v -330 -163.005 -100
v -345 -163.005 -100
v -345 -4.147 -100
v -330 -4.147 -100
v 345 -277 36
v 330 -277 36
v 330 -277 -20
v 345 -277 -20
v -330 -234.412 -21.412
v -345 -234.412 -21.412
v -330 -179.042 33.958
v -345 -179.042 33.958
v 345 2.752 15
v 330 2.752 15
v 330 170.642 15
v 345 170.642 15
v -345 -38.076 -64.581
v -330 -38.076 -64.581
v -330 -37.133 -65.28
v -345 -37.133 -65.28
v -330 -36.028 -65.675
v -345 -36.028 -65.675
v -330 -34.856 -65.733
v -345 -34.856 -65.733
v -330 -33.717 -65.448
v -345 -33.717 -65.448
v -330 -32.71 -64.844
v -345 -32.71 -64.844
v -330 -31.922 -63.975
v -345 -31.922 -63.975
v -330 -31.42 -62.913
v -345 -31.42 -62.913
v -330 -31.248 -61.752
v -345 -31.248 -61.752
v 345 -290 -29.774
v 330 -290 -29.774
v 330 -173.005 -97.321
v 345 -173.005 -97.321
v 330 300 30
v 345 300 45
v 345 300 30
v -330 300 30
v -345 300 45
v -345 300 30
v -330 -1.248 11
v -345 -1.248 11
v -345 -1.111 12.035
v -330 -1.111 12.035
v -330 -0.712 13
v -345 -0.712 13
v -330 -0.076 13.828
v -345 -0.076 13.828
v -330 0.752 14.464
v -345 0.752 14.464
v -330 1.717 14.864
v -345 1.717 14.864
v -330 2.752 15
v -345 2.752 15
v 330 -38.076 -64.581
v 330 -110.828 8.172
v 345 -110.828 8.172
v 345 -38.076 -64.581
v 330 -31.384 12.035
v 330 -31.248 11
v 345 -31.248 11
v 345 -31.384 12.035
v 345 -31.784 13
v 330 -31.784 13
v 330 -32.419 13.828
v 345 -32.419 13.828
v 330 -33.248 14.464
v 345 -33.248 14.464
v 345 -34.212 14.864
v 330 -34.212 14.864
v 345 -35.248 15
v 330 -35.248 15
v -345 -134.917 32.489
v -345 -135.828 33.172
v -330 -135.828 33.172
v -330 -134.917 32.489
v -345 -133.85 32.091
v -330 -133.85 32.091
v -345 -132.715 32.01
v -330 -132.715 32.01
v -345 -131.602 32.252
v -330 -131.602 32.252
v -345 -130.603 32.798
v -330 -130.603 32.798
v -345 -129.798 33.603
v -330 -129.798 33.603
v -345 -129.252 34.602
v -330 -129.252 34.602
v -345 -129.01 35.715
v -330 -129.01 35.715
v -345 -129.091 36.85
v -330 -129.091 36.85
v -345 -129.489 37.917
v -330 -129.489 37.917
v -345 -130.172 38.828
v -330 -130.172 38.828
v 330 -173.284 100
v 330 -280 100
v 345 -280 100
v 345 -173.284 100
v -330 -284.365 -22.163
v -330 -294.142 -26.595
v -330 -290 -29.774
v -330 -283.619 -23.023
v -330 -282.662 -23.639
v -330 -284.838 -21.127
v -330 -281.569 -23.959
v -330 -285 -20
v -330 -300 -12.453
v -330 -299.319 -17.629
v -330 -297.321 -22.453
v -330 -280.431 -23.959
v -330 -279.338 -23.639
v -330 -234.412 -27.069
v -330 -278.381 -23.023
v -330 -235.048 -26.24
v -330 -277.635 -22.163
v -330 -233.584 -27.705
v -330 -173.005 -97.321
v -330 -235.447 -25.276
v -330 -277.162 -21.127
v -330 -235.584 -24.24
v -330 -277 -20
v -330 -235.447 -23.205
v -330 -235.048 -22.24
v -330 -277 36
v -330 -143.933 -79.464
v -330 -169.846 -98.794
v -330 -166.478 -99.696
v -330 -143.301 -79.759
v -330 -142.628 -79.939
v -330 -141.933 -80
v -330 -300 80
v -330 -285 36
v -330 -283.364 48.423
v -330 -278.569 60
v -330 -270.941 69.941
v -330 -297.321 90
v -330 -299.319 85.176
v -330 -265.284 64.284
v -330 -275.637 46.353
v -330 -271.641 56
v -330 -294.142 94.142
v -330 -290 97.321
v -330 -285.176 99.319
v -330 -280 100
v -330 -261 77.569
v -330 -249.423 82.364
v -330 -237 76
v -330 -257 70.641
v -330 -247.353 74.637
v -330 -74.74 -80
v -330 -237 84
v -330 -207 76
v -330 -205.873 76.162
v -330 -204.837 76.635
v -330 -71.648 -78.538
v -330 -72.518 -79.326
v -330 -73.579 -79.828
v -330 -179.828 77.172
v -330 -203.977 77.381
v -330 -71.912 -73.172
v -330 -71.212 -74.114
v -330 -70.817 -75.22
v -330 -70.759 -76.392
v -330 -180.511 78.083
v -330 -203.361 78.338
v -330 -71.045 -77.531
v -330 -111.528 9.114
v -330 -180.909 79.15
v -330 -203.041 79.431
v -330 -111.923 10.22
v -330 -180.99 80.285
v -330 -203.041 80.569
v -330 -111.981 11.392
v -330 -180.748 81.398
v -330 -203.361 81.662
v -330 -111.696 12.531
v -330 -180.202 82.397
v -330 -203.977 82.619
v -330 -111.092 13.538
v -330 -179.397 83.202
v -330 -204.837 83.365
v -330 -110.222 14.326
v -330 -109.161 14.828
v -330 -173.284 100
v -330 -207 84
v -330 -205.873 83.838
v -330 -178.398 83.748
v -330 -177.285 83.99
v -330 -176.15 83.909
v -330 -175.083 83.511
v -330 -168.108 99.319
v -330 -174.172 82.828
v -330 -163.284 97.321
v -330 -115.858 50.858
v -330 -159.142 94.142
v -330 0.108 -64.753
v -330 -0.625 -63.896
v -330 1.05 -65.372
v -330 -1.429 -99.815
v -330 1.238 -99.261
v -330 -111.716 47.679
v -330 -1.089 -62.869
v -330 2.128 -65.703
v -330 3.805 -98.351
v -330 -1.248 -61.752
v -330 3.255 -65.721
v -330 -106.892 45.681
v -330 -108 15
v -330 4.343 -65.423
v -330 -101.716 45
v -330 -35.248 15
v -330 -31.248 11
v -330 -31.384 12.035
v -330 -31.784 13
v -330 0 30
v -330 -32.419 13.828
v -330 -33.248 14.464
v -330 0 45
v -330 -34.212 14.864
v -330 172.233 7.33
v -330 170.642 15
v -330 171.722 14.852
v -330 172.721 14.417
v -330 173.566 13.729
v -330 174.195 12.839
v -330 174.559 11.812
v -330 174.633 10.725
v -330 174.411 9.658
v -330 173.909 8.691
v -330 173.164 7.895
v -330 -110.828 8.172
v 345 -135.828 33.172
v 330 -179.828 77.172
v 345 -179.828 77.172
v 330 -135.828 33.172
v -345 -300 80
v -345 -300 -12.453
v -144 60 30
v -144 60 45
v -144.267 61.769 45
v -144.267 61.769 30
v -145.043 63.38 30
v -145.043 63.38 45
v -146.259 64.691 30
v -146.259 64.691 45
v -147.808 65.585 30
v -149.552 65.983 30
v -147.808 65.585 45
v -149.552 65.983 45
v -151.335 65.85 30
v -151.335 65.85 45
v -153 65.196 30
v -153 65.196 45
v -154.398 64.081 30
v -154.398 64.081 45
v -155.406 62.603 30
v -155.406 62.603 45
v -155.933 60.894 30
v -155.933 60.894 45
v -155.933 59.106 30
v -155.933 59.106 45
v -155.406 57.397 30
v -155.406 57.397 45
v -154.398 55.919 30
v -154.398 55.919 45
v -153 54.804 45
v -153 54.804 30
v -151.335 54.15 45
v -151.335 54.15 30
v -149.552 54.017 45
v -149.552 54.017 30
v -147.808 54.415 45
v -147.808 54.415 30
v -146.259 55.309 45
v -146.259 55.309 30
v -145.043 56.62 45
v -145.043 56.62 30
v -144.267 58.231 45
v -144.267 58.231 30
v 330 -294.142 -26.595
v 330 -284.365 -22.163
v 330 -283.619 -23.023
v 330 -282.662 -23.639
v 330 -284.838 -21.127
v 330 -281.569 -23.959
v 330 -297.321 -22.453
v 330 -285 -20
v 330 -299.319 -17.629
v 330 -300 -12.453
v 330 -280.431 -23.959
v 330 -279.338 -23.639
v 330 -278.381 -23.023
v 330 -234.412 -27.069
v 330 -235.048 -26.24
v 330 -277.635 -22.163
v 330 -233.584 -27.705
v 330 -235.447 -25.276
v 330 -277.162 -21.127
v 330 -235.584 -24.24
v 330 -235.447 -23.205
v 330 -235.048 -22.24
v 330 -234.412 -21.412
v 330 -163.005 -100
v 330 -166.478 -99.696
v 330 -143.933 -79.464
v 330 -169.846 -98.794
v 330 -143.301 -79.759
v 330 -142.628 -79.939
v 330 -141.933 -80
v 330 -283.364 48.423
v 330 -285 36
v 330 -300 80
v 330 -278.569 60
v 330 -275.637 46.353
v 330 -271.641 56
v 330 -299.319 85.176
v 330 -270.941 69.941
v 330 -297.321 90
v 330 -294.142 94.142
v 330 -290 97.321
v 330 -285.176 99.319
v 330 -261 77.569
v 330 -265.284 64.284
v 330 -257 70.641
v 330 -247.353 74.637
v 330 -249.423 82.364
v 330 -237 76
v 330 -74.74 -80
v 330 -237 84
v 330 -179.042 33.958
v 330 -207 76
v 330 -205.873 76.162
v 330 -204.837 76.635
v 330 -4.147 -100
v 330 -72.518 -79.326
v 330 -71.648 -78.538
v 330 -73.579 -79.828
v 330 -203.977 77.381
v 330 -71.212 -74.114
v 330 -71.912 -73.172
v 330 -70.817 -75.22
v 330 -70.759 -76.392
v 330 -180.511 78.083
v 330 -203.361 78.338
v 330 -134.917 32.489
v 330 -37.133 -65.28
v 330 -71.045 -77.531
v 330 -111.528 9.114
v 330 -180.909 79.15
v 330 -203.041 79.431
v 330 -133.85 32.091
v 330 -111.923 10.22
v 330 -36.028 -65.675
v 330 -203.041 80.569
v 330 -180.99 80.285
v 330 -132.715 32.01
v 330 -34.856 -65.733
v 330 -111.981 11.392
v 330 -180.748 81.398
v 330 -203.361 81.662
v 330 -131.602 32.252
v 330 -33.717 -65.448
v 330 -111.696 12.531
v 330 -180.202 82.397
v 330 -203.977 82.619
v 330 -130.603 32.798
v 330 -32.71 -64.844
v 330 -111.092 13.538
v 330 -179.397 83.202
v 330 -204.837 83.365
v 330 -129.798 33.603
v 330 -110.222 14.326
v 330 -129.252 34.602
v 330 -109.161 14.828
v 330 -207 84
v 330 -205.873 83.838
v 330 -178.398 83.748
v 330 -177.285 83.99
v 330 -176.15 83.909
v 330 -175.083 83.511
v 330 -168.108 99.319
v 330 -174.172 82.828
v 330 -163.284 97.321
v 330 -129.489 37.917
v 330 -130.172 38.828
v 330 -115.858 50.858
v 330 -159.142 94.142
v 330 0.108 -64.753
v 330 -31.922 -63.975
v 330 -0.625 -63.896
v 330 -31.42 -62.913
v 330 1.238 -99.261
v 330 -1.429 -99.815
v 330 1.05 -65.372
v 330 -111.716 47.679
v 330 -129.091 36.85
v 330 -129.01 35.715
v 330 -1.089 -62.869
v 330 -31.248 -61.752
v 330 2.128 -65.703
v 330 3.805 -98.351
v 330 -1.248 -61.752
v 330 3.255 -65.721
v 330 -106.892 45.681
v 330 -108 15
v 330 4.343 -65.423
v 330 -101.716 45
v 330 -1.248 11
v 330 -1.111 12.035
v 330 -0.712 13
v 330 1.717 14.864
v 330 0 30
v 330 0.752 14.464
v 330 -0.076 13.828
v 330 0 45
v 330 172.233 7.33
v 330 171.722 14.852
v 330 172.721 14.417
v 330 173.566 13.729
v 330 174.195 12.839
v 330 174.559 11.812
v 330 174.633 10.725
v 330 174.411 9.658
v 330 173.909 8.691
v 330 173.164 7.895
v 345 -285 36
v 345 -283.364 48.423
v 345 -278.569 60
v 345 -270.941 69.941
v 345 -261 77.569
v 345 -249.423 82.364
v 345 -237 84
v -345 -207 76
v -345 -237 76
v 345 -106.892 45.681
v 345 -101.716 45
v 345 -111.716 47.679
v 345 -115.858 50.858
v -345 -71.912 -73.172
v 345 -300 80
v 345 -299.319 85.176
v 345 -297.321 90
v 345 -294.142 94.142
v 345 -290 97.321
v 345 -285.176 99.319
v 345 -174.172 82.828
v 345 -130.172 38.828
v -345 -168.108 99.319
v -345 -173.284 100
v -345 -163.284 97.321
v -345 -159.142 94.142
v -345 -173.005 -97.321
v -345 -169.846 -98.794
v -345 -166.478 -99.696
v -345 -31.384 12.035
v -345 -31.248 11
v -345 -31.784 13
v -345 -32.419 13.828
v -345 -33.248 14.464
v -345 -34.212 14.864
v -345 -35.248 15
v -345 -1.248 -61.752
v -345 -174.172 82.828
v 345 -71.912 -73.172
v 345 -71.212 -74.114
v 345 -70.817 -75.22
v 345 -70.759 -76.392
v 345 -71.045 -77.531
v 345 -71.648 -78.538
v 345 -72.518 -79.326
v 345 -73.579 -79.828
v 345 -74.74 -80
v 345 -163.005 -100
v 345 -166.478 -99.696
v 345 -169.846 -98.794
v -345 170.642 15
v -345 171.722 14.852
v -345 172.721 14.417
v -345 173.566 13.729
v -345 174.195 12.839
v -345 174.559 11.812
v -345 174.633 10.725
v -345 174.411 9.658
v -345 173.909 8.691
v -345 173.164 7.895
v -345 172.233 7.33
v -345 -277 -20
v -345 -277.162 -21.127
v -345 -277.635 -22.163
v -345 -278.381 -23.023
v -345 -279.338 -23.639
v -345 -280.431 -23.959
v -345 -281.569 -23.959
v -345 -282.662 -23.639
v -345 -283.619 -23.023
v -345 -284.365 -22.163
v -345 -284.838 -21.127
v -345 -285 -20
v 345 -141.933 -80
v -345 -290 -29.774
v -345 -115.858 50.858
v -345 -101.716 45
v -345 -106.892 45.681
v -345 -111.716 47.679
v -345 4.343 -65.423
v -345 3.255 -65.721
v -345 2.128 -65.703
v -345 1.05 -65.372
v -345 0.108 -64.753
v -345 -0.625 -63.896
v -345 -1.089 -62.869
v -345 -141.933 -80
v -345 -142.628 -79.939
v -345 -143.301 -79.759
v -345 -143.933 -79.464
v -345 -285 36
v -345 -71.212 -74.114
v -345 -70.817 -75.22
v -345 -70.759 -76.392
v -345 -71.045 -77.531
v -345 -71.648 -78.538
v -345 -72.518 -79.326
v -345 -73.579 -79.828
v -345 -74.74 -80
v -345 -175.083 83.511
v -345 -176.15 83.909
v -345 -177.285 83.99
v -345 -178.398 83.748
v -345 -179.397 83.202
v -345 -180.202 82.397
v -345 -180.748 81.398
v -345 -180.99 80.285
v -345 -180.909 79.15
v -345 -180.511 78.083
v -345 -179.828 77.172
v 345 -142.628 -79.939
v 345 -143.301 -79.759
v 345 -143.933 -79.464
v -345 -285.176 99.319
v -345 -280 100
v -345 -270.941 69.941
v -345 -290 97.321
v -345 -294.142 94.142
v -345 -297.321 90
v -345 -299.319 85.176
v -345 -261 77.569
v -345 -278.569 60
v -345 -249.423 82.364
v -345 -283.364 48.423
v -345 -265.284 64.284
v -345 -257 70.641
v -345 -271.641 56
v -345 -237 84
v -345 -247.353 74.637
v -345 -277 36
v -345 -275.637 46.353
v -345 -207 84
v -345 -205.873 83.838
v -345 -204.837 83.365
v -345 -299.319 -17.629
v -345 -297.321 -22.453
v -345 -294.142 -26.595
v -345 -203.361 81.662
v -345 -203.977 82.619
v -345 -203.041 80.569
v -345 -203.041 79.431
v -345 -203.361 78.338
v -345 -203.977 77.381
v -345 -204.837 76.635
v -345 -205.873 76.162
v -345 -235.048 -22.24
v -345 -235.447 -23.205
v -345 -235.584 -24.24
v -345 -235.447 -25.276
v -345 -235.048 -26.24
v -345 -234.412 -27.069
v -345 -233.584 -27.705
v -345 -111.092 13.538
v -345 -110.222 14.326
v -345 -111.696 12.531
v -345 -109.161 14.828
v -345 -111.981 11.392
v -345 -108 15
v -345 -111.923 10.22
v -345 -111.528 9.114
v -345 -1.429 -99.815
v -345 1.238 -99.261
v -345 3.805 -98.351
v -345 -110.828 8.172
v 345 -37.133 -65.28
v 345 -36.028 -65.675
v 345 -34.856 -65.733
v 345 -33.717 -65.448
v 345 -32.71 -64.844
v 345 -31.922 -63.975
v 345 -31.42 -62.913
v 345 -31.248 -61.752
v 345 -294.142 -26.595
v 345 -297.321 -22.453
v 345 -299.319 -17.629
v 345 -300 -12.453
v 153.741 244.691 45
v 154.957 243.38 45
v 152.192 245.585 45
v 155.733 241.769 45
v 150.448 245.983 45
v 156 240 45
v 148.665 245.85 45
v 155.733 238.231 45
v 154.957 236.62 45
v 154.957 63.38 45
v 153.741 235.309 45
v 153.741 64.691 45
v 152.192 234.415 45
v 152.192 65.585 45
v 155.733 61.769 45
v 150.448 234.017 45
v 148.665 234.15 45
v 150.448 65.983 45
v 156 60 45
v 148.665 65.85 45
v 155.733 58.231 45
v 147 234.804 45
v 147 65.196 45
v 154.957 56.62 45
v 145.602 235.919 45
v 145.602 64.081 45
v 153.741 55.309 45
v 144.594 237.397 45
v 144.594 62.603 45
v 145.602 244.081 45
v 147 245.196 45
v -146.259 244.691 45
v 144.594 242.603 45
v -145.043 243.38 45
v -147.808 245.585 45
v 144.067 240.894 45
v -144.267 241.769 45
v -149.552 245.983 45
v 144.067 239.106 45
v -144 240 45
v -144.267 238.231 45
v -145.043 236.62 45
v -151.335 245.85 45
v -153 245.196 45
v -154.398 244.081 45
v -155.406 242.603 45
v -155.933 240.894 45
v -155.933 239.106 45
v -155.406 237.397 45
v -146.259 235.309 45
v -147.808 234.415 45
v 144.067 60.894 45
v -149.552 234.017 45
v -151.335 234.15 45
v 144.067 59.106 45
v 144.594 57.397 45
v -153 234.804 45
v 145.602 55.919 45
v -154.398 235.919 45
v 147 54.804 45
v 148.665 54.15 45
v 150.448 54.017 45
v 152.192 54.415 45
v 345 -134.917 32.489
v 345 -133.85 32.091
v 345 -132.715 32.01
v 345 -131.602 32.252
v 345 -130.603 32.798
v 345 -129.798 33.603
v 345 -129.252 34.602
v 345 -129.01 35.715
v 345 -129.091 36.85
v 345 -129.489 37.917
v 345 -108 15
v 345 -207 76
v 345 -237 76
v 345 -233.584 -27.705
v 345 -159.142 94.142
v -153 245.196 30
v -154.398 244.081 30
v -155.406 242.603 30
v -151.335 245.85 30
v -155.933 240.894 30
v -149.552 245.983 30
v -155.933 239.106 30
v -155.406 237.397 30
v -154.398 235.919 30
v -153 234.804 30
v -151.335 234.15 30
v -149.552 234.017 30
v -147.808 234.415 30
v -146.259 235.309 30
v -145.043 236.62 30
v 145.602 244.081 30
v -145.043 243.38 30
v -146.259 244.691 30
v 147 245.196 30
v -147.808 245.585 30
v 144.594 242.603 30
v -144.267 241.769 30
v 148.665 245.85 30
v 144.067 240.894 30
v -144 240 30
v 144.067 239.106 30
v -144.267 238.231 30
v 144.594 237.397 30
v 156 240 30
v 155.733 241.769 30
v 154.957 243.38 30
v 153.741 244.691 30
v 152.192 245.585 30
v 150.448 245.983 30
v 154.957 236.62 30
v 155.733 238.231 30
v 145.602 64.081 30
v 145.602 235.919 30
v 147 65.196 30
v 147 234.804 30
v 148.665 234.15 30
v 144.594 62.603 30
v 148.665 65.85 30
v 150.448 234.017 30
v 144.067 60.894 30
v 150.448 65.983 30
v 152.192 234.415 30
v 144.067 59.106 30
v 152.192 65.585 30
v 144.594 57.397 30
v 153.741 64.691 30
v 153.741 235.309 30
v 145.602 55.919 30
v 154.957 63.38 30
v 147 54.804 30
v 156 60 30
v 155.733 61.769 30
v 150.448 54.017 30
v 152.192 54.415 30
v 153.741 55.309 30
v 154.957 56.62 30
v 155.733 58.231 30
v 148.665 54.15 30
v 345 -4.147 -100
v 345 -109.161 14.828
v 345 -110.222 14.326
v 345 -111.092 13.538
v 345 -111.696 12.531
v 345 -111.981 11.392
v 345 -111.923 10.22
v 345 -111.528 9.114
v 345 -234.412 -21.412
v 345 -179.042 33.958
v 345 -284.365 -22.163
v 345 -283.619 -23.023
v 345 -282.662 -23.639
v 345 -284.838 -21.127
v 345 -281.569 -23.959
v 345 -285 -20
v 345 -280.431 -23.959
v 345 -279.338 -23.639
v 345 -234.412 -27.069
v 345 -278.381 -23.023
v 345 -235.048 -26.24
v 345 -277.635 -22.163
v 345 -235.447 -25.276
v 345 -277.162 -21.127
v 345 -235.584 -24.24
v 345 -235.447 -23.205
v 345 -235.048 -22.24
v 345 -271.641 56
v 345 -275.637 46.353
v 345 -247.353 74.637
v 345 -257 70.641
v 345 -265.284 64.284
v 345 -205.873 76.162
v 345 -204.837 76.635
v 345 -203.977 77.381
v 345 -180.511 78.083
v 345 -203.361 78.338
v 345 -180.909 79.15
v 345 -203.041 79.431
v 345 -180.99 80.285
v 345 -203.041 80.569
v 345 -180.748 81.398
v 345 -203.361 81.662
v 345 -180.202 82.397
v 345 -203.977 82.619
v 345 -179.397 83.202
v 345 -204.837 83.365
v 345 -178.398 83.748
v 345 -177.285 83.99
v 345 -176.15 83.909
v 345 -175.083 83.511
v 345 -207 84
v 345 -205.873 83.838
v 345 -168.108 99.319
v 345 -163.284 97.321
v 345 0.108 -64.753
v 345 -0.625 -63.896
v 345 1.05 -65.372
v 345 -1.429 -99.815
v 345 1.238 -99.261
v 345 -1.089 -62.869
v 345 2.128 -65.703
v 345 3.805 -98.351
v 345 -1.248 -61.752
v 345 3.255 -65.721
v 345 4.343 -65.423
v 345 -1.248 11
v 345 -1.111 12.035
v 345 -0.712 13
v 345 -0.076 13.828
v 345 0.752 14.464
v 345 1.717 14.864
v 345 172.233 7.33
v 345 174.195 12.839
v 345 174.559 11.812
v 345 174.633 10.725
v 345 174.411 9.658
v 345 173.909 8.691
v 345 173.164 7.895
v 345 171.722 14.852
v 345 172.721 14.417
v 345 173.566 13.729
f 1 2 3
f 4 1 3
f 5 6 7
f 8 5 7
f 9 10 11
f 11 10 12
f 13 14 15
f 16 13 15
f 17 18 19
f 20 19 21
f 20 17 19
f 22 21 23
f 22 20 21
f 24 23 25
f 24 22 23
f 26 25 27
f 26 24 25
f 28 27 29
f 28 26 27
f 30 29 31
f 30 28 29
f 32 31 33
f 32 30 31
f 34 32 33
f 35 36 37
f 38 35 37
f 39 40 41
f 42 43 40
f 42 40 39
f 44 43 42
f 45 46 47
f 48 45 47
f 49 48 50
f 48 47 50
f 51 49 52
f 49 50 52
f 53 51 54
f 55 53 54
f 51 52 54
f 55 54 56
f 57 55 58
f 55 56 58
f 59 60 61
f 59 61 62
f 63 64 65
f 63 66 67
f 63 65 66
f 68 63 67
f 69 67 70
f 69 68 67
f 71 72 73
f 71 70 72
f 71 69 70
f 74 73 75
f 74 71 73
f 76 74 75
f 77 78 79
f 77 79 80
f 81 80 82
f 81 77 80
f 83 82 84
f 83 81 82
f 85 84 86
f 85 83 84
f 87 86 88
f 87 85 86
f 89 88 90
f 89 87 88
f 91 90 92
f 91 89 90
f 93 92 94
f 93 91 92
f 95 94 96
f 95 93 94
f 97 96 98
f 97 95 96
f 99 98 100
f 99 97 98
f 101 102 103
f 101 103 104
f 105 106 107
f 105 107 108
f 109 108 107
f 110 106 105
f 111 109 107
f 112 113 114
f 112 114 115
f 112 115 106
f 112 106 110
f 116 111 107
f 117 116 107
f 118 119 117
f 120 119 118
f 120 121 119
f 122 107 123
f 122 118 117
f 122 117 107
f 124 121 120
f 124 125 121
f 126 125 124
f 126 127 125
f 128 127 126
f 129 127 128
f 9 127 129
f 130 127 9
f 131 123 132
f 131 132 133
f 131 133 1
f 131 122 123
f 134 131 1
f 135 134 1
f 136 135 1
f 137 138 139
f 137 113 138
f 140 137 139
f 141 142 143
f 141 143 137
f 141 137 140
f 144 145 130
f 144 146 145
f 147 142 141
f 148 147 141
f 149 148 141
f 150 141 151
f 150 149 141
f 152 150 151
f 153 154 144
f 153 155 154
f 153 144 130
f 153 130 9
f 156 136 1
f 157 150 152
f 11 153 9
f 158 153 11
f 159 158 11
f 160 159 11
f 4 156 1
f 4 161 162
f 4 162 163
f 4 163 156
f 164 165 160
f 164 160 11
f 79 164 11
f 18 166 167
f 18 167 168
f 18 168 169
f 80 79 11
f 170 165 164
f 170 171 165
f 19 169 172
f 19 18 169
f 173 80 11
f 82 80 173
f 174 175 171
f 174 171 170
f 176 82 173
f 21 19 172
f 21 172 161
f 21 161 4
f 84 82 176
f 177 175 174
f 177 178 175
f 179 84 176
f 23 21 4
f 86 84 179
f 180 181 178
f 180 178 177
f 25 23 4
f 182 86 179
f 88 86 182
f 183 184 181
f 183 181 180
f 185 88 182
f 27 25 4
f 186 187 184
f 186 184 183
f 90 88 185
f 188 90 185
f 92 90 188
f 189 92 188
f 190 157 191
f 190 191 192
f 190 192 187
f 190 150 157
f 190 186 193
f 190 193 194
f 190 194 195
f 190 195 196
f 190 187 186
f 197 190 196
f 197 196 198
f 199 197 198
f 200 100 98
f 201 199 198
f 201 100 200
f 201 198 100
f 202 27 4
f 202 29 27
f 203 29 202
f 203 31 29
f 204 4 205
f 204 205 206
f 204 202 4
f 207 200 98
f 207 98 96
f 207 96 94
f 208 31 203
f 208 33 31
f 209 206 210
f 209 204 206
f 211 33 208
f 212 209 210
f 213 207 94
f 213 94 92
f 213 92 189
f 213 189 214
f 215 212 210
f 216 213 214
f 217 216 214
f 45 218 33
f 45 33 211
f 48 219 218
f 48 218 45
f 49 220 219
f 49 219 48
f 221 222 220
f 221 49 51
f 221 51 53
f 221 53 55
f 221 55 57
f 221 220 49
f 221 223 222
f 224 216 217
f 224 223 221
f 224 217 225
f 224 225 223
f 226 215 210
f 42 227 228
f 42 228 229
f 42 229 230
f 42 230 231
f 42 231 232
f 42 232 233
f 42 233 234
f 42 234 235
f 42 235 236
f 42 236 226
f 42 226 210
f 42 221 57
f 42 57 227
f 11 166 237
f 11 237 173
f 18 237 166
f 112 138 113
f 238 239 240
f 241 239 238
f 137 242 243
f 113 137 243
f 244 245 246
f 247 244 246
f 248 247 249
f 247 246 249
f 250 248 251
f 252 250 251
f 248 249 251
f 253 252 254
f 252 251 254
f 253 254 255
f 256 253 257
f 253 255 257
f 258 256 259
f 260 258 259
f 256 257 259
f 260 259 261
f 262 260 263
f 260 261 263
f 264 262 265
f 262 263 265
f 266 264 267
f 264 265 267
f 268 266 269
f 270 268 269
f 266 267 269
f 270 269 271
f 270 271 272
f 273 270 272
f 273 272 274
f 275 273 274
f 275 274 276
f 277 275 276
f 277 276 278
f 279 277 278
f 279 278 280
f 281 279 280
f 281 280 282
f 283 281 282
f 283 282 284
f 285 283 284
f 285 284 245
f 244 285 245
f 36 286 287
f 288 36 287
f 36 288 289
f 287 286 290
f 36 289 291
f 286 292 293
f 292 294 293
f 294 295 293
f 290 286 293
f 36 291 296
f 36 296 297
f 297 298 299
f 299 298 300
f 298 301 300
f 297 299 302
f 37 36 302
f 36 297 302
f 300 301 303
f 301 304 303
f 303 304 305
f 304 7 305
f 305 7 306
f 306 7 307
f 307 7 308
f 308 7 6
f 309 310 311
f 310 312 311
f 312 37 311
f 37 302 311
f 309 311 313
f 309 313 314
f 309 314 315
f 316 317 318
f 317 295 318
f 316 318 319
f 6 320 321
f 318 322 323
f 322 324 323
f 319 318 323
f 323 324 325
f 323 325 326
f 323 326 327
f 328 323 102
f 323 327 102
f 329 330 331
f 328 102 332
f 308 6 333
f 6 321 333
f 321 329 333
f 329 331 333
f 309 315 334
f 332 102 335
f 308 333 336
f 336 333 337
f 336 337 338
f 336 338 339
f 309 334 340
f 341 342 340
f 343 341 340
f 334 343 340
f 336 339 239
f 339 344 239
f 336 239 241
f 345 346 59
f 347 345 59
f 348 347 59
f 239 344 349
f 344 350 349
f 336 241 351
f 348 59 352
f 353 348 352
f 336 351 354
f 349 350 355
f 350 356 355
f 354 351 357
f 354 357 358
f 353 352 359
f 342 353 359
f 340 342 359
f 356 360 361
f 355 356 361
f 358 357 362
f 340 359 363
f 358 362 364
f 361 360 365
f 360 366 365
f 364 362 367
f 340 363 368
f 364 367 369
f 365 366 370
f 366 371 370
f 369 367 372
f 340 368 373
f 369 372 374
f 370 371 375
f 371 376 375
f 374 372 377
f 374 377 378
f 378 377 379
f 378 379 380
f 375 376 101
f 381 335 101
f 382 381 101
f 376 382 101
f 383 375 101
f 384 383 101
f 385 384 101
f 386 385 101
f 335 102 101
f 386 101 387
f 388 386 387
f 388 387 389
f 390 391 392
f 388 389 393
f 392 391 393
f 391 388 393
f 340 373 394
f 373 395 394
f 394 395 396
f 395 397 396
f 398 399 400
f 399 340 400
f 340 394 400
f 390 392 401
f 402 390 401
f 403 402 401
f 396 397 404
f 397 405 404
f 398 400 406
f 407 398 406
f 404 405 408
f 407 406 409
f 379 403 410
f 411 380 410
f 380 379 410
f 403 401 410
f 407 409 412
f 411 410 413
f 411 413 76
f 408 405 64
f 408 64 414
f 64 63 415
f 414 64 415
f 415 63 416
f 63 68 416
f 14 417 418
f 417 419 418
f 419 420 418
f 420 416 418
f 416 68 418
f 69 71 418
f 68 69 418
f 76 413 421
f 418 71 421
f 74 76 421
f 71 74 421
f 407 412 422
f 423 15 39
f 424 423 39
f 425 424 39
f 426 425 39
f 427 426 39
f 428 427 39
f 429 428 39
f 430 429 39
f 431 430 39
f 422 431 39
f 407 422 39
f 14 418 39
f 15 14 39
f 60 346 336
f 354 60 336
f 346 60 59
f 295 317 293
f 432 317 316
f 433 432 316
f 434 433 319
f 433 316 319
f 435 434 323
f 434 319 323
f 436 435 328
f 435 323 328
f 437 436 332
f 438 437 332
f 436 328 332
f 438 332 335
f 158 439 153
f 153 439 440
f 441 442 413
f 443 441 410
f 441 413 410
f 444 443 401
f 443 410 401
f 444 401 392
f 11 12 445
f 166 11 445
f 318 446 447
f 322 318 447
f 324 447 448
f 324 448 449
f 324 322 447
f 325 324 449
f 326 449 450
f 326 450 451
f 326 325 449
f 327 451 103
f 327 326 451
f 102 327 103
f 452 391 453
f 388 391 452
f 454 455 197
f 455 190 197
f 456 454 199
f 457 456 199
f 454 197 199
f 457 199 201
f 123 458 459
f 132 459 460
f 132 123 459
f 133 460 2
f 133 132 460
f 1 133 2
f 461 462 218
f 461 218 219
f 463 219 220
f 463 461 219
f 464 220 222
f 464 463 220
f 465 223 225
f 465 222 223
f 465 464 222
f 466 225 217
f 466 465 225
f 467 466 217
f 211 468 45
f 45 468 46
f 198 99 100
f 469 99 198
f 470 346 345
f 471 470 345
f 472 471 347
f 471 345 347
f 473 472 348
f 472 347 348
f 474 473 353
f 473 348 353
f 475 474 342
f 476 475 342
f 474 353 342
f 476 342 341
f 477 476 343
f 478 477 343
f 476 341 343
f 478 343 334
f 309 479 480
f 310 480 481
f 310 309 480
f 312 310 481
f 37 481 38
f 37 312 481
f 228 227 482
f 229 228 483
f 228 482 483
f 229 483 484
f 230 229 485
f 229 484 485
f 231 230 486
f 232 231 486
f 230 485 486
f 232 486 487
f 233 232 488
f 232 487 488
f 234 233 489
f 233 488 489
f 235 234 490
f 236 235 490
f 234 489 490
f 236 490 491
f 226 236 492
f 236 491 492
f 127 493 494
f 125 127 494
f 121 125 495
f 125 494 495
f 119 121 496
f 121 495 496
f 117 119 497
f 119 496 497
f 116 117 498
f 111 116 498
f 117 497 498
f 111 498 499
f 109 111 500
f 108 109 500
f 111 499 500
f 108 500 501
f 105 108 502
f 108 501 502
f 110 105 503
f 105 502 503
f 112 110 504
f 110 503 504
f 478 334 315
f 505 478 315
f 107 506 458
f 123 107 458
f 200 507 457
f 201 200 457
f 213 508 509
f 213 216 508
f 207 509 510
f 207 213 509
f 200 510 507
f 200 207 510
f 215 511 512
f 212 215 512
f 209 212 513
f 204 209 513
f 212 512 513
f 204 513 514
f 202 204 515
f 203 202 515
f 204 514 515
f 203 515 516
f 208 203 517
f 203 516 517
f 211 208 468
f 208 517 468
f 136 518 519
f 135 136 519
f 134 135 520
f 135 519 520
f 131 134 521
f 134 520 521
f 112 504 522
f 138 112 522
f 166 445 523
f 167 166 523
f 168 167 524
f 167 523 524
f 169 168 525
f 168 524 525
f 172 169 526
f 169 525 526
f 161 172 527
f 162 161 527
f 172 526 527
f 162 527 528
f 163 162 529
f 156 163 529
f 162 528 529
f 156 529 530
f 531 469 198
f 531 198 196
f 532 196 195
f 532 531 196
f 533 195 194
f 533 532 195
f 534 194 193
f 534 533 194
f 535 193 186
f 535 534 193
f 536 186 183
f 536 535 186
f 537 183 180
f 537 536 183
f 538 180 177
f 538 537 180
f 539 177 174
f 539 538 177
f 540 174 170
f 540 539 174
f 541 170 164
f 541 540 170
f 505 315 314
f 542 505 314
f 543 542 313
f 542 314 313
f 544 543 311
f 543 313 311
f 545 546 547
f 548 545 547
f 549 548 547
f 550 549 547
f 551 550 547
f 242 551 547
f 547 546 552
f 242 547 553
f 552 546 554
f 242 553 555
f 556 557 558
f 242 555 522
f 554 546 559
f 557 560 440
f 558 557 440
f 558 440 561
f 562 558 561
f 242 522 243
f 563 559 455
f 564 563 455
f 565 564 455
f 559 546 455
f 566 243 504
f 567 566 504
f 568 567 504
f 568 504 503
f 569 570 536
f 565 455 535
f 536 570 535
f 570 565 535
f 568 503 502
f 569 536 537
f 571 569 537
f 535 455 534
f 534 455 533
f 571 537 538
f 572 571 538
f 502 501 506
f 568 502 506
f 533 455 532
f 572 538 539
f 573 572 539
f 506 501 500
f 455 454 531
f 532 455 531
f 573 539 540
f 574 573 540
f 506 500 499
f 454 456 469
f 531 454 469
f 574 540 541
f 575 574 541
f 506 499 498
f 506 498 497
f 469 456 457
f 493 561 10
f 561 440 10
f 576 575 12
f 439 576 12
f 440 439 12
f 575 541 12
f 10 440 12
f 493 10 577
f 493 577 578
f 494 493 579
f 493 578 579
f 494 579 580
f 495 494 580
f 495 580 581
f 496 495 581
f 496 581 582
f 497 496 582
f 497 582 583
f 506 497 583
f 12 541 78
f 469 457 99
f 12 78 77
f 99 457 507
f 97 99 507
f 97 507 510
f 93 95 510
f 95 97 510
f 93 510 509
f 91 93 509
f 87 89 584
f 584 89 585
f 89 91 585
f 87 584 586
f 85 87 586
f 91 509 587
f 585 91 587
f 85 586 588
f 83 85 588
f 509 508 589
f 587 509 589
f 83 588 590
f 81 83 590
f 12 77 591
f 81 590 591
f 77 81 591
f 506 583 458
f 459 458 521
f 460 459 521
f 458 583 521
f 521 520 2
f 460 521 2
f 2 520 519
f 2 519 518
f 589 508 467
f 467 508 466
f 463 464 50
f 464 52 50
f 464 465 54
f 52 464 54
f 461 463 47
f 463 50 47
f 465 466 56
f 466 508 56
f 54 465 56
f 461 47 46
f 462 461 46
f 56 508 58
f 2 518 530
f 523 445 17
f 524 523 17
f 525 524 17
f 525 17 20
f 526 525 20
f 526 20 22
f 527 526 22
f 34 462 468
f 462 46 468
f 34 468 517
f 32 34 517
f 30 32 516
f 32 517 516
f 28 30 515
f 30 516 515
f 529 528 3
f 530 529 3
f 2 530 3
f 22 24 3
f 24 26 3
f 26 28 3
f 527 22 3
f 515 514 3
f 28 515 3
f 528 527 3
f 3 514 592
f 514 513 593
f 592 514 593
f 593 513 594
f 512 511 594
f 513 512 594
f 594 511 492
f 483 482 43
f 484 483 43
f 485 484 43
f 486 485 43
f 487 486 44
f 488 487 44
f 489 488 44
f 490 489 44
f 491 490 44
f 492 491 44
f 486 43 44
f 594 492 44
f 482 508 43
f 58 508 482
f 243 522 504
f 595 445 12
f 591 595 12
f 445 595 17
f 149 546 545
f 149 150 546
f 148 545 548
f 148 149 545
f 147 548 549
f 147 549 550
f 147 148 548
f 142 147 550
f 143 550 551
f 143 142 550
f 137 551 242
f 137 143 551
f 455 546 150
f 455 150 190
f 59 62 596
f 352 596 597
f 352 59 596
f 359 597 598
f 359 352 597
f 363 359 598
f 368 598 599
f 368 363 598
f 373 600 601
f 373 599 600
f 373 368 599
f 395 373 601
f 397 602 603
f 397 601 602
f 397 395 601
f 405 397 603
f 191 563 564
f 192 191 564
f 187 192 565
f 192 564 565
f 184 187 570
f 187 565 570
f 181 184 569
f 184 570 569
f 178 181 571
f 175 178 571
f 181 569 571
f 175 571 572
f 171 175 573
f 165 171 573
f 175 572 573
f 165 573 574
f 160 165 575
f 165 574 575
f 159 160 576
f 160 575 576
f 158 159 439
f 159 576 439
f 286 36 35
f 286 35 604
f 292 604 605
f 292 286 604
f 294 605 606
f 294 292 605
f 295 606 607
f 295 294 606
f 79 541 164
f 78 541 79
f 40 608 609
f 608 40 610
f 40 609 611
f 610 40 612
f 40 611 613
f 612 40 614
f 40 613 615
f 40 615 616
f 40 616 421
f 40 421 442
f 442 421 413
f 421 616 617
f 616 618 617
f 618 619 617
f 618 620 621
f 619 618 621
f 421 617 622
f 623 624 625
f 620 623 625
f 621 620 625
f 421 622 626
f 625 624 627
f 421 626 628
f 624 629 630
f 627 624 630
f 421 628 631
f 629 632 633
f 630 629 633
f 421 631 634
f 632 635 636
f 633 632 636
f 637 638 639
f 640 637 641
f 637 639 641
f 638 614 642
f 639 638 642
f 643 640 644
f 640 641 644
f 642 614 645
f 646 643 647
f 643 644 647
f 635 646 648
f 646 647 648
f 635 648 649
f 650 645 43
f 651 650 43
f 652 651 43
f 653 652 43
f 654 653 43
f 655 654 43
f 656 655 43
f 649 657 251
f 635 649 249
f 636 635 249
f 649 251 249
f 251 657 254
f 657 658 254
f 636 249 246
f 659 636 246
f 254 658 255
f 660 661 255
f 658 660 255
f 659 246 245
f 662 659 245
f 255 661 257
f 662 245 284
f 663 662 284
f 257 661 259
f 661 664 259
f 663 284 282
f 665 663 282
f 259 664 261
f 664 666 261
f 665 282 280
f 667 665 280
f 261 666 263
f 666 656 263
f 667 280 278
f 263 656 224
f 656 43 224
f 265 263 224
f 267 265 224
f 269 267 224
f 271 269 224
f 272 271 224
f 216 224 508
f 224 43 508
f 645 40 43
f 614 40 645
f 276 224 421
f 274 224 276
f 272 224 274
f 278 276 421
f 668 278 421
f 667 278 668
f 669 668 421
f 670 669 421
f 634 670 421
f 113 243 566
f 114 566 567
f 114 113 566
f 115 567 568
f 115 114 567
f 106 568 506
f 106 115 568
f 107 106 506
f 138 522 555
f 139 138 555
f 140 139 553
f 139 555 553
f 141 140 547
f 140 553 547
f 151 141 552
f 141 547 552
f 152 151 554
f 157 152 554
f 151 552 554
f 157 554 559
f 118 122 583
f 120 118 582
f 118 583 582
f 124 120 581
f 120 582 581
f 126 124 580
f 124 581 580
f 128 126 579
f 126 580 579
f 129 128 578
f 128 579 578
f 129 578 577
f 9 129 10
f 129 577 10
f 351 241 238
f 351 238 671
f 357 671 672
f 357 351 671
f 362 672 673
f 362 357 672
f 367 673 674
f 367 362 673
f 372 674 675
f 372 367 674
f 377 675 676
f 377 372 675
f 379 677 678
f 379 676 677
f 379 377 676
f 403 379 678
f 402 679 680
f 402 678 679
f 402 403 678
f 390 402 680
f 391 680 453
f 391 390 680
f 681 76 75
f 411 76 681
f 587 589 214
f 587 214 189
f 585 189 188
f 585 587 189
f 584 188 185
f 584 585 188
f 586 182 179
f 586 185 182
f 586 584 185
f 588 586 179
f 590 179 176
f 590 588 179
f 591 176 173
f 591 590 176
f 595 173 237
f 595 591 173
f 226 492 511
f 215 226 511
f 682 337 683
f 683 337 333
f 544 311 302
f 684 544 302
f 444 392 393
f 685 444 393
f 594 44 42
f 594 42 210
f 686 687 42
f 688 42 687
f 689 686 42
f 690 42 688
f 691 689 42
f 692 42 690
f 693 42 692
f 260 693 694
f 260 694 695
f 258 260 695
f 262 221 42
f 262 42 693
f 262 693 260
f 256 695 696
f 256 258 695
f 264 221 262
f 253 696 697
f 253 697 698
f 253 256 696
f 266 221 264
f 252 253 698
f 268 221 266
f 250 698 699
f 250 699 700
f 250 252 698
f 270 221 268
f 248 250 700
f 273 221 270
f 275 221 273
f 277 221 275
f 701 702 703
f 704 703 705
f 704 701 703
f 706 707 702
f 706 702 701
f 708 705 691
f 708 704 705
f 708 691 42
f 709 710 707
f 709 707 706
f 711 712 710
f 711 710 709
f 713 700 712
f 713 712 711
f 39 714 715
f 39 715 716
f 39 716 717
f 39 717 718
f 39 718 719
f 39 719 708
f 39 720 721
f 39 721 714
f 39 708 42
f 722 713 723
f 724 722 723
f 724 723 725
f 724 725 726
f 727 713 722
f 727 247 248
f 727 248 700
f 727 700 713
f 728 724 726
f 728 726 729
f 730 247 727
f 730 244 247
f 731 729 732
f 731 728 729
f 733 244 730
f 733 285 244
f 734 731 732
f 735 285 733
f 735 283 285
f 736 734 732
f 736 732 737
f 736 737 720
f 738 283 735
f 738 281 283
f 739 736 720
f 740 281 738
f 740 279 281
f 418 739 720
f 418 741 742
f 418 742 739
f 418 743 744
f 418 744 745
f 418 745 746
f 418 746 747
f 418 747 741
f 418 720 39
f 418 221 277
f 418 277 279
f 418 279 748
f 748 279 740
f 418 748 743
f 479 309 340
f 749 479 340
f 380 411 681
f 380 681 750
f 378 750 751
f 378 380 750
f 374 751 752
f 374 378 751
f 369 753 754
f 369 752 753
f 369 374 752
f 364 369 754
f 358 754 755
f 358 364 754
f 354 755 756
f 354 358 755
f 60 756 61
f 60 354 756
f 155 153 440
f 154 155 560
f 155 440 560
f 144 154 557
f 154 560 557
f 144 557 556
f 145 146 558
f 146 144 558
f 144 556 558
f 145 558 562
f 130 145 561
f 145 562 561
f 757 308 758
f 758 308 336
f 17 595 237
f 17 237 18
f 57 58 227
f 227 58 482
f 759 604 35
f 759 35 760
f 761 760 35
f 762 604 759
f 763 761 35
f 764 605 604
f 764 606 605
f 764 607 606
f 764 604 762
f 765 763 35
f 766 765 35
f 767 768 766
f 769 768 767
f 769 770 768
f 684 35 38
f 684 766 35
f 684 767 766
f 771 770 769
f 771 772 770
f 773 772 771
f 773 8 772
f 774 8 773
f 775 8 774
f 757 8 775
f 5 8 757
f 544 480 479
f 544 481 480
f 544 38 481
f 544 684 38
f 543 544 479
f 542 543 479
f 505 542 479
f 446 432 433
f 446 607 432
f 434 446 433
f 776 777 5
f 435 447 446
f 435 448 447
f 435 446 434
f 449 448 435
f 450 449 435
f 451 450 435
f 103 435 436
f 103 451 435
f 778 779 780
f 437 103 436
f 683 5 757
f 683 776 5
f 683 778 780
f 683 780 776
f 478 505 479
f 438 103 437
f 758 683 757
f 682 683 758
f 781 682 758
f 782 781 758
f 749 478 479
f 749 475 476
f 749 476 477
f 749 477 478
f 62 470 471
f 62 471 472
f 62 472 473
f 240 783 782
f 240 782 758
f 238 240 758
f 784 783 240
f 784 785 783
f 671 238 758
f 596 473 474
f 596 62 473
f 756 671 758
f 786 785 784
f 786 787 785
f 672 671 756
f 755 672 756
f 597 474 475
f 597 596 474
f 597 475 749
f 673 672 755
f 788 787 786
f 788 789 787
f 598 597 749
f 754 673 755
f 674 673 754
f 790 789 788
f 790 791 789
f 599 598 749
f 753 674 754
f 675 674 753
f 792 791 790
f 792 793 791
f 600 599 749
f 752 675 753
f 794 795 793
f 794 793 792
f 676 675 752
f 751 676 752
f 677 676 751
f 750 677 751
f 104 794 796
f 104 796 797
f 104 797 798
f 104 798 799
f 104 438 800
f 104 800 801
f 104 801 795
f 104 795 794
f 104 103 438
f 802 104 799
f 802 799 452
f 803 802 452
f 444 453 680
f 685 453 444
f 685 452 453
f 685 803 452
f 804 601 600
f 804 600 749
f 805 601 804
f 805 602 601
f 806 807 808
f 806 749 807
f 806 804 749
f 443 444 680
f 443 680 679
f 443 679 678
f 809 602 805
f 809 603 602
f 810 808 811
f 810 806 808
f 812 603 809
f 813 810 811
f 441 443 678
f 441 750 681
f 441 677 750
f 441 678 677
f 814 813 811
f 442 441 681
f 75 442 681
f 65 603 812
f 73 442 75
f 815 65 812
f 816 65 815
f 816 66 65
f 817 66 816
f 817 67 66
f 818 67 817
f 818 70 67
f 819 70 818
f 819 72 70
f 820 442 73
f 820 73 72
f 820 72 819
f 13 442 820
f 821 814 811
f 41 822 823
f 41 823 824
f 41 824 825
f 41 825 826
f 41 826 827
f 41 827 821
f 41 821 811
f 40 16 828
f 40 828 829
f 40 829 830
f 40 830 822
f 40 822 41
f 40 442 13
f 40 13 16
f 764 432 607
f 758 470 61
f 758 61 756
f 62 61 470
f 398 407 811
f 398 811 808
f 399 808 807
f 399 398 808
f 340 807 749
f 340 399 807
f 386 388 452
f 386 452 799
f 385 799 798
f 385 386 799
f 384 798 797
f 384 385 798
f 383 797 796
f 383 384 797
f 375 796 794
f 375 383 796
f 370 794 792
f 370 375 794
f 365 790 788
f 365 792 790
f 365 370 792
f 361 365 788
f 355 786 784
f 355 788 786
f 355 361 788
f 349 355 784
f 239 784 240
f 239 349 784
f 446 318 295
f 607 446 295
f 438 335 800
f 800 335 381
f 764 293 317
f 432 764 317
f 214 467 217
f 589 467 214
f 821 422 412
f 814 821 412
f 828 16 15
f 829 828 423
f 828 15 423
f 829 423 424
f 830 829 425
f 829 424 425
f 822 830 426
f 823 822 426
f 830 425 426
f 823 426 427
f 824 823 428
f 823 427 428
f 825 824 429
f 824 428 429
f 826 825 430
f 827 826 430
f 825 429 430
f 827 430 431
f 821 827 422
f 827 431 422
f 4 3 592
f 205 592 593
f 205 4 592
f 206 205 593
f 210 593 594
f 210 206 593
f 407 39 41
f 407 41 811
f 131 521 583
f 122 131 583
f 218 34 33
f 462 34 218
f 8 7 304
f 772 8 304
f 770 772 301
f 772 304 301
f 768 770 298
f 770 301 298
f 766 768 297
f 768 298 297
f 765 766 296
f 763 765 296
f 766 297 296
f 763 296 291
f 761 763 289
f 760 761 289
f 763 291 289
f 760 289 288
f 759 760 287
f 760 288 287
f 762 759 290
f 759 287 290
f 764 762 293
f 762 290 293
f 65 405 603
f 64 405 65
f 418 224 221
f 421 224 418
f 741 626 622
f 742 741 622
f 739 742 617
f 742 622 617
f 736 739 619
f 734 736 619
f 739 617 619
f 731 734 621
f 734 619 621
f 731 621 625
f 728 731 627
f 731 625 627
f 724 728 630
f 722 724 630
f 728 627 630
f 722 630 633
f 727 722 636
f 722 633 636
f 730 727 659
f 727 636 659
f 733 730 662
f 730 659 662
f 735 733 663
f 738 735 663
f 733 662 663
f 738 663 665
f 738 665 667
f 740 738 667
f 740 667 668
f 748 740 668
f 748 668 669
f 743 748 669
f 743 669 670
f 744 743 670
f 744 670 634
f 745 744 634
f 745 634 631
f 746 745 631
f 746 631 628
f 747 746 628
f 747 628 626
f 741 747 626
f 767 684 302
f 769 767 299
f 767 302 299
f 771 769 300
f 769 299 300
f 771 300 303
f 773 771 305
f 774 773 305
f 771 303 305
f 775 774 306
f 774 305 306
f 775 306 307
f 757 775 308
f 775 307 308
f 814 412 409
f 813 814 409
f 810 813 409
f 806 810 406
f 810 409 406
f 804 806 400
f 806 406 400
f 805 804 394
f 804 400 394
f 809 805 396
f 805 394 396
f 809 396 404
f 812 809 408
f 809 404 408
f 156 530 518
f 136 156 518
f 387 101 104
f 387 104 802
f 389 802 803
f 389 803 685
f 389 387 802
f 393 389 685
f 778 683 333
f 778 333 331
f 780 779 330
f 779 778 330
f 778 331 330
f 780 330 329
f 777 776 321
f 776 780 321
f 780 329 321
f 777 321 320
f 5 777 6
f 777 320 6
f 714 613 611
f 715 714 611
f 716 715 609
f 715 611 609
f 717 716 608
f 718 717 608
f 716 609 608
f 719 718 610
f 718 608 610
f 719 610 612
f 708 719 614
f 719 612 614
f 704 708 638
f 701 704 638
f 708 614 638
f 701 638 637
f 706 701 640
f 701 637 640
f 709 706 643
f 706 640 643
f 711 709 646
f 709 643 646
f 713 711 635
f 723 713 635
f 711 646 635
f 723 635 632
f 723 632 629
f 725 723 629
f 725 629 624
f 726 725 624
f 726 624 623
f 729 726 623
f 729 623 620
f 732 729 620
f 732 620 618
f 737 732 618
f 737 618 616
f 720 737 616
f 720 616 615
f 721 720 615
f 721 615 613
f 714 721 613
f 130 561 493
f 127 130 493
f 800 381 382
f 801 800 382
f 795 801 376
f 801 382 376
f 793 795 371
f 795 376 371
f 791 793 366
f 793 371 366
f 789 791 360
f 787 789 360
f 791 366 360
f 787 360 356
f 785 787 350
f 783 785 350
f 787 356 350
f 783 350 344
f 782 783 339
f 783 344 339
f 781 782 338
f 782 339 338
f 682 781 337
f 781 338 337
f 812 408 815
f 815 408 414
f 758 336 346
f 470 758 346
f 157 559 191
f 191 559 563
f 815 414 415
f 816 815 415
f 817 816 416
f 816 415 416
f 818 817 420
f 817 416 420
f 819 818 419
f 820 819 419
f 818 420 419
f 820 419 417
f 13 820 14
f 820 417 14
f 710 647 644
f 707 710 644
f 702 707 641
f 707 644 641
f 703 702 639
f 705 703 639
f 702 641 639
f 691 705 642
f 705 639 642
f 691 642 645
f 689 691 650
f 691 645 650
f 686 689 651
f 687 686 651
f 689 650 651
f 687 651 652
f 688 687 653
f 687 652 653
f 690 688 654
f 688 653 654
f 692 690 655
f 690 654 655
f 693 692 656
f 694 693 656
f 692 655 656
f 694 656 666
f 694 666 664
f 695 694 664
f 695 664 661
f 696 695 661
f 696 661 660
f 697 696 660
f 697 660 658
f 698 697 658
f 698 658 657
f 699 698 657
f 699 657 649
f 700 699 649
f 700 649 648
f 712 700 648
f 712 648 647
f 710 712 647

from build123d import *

# Parameters (mm, degrees)
DODANIE_WYCI_GNI_CIE1_DEPTH      = 345
DODANIE_WYCI_GNI_CIE1_DEPTH_BACK = 345
SZKIC1_W                         = 200
SZKIC1_H                         = 600
SZKIC2_R                         = 6
SZKIC2_W                         = 660
SZKIC2_H                         = 300
WYTNIJ_WYCI_GNI_CIE1_DEPTH       = 500.024047517
WYTNIJ_WYCI_GNI_CIE2_DEPTH       = 760.012516366
WYTNIJ_WYCI_GNI_CIE3_DEPTH       = 760.012516366
SZKIC5_W                         = 660
SZKIC5_H                         = 130
WYTNIJ_WYCI_GNI_CIE5_DEPTH       = 469.001068375
ZAOKR_GLENIE1_R                  = 20
LUSTRO1_START                    = 330
LUSTRO1_DEPTH                    = 15
LUSTRO1_2_DEPTH                  = 15


# Read off the part's stored shape, not the designer's step: Lustro1
with BuildPart() as part:
    # Szkic1 → Dodanie-wyciągnięcie1 (new, two sides: drawn at the far end of the back side and taken through both)
    with BuildSketch(Plane(origin=(0, 0, 0), x_dir=(0, 0, -1), z_dir=(1, 0, 0)).offset(-DODANIE_WYCI_GNI_CIE1_DEPTH_BACK)):
        Rectangle(SZKIC1_W, SZKIC1_H)
    extrude(amount=DODANIE_WYCI_GNI_CIE1_DEPTH + DODANIE_WYCI_GNI_CIE1_DEPTH_BACK)

    # Szkic2 → Wytnij-wyciągnięcie1 (cut, through all)
    with BuildSketch(Plane.XY.offset(100)):
        with Locations((-150, 240)):
            Circle(SZKIC2_R)
        with Locations((-150, 60)):
            Circle(SZKIC2_R)
        with Locations((150, 60)):
            Circle(SZKIC2_R)
        with Locations((150, 240)):
            Circle(SZKIC2_R)
        with Locations((0, -150)):
            Rectangle(SZKIC2_W, SZKIC2_H)
    extrude(amount=-WYTNIJ_WYCI_GNI_CIE1_DEPTH, mode=Mode.SUBTRACT)

    # Szkic3 → Wytnij-wyciągnięcie2 (cut, through all)
    with BuildSketch(Plane.ZY.offset(345)):
        Polygon((45, -110), (100, -165), (100, 300), (45, 300), align=None)
        Polygon((30, 300), (-100, 0), (-100, 300), align=None)
    extrude(amount=-WYTNIJ_WYCI_GNI_CIE2_DEPTH, mode=Mode.SUBTRACT)

    # Szkic4 → Wytnij-wyciągnięcie3 (cut, through all)
    with BuildSketch(Plane.ZY.offset(345)):
        with BuildLine():
            Line((-20, -285), (36, -285))
            ThreePointArc((36, -285), (69.941125497, -270.941125497), (84, -237))
            Line((84, -237), (84, -207))
            ThreePointArc((84, -207), (80, -203), (76, -207))
            Line((76, -207), (76, -237))
            ThreePointArc((76, -237), (64.284271247, -265.284271247), (36, -277))
            Line((36, -277), (-20, -277))
            ThreePointArc((-20, -277), (-24, -281), (-20, -285))
        make_face()
        with BuildLine():
            Line((77.171572875, -179.828427125), (33.171572875, -135.828427125))
            ThreePointArc((33.171572875, -135.828427125), (33.171572875, -130.171572875), (38.828427125, -130.171572875))
            Line((38.828427125, -130.171572875), (82.828427125, -174.171572875))
            ThreePointArc((82.828427125, -174.171572875), (82.828427125, -179.828427125), (77.171572875, -179.828427125))
        make_face()
        with BuildLine():
            Line((8.171572875, -110.828427125), (-64.580770724, -38.076083526))
            ThreePointArc((-64.580770724, -38.076083526), (-65.447861729, -33.716922672), (-61.752343599, -31.247656401))
            Line((-61.752343599, -31.247656401), (11, -31.247656401))
            ThreePointArc((11, -31.247656401), (13.828427125, -32.419229276), (15, -35.247656401))
            Line((15, -35.247656401), (15, -108))
            ThreePointArc((15, -108), (12.530733729, -111.69551813), (8.171572875, -110.828427125))
        make_face()
        with BuildLine():
            Line((-61.752343599, -1.247656401), (11, -1.247656401))
            ThreePointArc((11, -1.247656401), (13.828427125, -0.076083526), (15, 2.752343599))
            Line((15, 2.752343599), (15, 170.642367288))
            ThreePointArc((15, 170.642367288), (11.812129914, 174.559055303), (7.329777499, 172.232797039))
            Line((7.329777499, 172.232797039), (-65.4225661, 4.342773349))
            ThreePointArc((-65.4225661, 4.342773349), (-65.096122823, 0.557089514), (-61.752343599, -1.247656401))
        make_face()
        with BuildLine():
            Line((33.95836944, -179.04163056), (-73.171572875, -71.911688245))
            ThreePointArc((-73.171572875, -71.911688245), (-77.530733729, -71.04459724), (-80, -74.74011537))
            Line((-80, -74.74011537), (-80, -141.933358006))
            ThreePointArc((-80, -141.933358006), (-79.863703305, -142.968634187), (-79.464101615, -143.933358006))
            Line((-79.464101615, -143.933358006), (-27.704526957, -233.583571092))
            ThreePointArc((-27.704526957, -233.583571092), (-24.762530111, -235.549350538), (-21.411998217, -234.411998217))
            Line((-21.411998217, -234.411998217), (33.95836944, -179.04163056))
        make_face()
        Polygon((-24, -300), (-100, -168.364138625), (-100, -300), align=None)
    extrude(amount=-WYTNIJ_WYCI_GNI_CIE3_DEPTH, mode=Mode.SUBTRACT)

    # Szkic5 → Wytnij-wyciągnięcie5 (cut, through all)
    with BuildSketch(Plane(origin=(0, 0, 0), x_dir=(1, 0, 0), z_dir=(0, 1, 0))):
        with Locations((0, 35)):
            Rectangle(SZKIC5_W, SZKIC5_H)
    extrude(amount=WYTNIJ_WYCI_GNI_CIE5_DEPTH, mode=Mode.SUBTRACT)

    # Zaokrąglenie1
    zaokr_glenie1_edges = [part.edges().sort_by_distance(p)[0] for p in [
        (-337.5, -300, -24),
        (-337.5, -168.364138625, -100),
        (-337.5, -110, 45),
        (-337.5, -165, 100),
        (-337.5, -300, 100),
        (-337.5, 0, -100),
    ]]
    fillet(zaokr_glenie1_edges, radius=ZAOKR_GLENIE1_R)

    # Lustro1 outline → Lustro1 (cut)
    with BuildSketch(Plane.YZ.offset(LUSTRO1_START)):
        with BuildLine():
            ThreePointArc((3.805124986, -98.351112506), (-0.086374196, -99.583440072), (-4.147023767, -100))
            Line((-4.147023767, -100), (0, -100))
            Line((0, -100), (3.805124986, -98.351112506))
        make_face()
        with BuildLine():
            ThreePointArc((-163.005154776, -100), (-168.181535678, -99.318516526), (-173.005154776, -97.320508076))
            Line((-173.005154776, -97.320508076), (-168.364138625, -100))
            Line((-168.364138625, -100), (-163.005154776, -100))
        make_face()
        with BuildLine():
            ThreePointArc((-290, -29.773502692), (-297.320508076, -22.452994616), (-300, -12.452994616))
            Line((-300, -12.452994616), (-300, -24))
            Line((-300, -24), (-290, -29.773502692))
        make_face()
        with BuildLine():
            ThreePointArc((-300, 80), (-294.142135624, 94.142135624), (-280, 100))
            Line((-280, 100), (-300, 100))
            Line((-300, 100), (-300, 80))
        make_face()
        with BuildLine():
            ThreePointArc((-173.284271247, 100), (-165.6306026, 98.47759065), (-159.142135624, 94.142135624))
            Line((-159.142135624, 94.142135624), (-165, 100))
            Line((-165, 100), (-173.284271247, 100))
        make_face()
    extrude(amount=LUSTRO1_DEPTH, mode=Mode.SUBTRACT)

    # Lustro1 2 outline → Lustro1 2 (add)
    with BuildSketch(Plane.YZ.offset(LUSTRO1_START)):
        with BuildLine():
            ThreePointArc((-101.715728753, 45), (-109.3693974, 46.52240935), (-115.857864376, 50.857864376))
            Line((-115.857864376, 50.857864376), (-110, 45))
            Line((-110, 45), (-101.715728753, 45))
        make_face()
    extrude(amount=LUSTRO1_2_DEPTH)


solid = part.part
